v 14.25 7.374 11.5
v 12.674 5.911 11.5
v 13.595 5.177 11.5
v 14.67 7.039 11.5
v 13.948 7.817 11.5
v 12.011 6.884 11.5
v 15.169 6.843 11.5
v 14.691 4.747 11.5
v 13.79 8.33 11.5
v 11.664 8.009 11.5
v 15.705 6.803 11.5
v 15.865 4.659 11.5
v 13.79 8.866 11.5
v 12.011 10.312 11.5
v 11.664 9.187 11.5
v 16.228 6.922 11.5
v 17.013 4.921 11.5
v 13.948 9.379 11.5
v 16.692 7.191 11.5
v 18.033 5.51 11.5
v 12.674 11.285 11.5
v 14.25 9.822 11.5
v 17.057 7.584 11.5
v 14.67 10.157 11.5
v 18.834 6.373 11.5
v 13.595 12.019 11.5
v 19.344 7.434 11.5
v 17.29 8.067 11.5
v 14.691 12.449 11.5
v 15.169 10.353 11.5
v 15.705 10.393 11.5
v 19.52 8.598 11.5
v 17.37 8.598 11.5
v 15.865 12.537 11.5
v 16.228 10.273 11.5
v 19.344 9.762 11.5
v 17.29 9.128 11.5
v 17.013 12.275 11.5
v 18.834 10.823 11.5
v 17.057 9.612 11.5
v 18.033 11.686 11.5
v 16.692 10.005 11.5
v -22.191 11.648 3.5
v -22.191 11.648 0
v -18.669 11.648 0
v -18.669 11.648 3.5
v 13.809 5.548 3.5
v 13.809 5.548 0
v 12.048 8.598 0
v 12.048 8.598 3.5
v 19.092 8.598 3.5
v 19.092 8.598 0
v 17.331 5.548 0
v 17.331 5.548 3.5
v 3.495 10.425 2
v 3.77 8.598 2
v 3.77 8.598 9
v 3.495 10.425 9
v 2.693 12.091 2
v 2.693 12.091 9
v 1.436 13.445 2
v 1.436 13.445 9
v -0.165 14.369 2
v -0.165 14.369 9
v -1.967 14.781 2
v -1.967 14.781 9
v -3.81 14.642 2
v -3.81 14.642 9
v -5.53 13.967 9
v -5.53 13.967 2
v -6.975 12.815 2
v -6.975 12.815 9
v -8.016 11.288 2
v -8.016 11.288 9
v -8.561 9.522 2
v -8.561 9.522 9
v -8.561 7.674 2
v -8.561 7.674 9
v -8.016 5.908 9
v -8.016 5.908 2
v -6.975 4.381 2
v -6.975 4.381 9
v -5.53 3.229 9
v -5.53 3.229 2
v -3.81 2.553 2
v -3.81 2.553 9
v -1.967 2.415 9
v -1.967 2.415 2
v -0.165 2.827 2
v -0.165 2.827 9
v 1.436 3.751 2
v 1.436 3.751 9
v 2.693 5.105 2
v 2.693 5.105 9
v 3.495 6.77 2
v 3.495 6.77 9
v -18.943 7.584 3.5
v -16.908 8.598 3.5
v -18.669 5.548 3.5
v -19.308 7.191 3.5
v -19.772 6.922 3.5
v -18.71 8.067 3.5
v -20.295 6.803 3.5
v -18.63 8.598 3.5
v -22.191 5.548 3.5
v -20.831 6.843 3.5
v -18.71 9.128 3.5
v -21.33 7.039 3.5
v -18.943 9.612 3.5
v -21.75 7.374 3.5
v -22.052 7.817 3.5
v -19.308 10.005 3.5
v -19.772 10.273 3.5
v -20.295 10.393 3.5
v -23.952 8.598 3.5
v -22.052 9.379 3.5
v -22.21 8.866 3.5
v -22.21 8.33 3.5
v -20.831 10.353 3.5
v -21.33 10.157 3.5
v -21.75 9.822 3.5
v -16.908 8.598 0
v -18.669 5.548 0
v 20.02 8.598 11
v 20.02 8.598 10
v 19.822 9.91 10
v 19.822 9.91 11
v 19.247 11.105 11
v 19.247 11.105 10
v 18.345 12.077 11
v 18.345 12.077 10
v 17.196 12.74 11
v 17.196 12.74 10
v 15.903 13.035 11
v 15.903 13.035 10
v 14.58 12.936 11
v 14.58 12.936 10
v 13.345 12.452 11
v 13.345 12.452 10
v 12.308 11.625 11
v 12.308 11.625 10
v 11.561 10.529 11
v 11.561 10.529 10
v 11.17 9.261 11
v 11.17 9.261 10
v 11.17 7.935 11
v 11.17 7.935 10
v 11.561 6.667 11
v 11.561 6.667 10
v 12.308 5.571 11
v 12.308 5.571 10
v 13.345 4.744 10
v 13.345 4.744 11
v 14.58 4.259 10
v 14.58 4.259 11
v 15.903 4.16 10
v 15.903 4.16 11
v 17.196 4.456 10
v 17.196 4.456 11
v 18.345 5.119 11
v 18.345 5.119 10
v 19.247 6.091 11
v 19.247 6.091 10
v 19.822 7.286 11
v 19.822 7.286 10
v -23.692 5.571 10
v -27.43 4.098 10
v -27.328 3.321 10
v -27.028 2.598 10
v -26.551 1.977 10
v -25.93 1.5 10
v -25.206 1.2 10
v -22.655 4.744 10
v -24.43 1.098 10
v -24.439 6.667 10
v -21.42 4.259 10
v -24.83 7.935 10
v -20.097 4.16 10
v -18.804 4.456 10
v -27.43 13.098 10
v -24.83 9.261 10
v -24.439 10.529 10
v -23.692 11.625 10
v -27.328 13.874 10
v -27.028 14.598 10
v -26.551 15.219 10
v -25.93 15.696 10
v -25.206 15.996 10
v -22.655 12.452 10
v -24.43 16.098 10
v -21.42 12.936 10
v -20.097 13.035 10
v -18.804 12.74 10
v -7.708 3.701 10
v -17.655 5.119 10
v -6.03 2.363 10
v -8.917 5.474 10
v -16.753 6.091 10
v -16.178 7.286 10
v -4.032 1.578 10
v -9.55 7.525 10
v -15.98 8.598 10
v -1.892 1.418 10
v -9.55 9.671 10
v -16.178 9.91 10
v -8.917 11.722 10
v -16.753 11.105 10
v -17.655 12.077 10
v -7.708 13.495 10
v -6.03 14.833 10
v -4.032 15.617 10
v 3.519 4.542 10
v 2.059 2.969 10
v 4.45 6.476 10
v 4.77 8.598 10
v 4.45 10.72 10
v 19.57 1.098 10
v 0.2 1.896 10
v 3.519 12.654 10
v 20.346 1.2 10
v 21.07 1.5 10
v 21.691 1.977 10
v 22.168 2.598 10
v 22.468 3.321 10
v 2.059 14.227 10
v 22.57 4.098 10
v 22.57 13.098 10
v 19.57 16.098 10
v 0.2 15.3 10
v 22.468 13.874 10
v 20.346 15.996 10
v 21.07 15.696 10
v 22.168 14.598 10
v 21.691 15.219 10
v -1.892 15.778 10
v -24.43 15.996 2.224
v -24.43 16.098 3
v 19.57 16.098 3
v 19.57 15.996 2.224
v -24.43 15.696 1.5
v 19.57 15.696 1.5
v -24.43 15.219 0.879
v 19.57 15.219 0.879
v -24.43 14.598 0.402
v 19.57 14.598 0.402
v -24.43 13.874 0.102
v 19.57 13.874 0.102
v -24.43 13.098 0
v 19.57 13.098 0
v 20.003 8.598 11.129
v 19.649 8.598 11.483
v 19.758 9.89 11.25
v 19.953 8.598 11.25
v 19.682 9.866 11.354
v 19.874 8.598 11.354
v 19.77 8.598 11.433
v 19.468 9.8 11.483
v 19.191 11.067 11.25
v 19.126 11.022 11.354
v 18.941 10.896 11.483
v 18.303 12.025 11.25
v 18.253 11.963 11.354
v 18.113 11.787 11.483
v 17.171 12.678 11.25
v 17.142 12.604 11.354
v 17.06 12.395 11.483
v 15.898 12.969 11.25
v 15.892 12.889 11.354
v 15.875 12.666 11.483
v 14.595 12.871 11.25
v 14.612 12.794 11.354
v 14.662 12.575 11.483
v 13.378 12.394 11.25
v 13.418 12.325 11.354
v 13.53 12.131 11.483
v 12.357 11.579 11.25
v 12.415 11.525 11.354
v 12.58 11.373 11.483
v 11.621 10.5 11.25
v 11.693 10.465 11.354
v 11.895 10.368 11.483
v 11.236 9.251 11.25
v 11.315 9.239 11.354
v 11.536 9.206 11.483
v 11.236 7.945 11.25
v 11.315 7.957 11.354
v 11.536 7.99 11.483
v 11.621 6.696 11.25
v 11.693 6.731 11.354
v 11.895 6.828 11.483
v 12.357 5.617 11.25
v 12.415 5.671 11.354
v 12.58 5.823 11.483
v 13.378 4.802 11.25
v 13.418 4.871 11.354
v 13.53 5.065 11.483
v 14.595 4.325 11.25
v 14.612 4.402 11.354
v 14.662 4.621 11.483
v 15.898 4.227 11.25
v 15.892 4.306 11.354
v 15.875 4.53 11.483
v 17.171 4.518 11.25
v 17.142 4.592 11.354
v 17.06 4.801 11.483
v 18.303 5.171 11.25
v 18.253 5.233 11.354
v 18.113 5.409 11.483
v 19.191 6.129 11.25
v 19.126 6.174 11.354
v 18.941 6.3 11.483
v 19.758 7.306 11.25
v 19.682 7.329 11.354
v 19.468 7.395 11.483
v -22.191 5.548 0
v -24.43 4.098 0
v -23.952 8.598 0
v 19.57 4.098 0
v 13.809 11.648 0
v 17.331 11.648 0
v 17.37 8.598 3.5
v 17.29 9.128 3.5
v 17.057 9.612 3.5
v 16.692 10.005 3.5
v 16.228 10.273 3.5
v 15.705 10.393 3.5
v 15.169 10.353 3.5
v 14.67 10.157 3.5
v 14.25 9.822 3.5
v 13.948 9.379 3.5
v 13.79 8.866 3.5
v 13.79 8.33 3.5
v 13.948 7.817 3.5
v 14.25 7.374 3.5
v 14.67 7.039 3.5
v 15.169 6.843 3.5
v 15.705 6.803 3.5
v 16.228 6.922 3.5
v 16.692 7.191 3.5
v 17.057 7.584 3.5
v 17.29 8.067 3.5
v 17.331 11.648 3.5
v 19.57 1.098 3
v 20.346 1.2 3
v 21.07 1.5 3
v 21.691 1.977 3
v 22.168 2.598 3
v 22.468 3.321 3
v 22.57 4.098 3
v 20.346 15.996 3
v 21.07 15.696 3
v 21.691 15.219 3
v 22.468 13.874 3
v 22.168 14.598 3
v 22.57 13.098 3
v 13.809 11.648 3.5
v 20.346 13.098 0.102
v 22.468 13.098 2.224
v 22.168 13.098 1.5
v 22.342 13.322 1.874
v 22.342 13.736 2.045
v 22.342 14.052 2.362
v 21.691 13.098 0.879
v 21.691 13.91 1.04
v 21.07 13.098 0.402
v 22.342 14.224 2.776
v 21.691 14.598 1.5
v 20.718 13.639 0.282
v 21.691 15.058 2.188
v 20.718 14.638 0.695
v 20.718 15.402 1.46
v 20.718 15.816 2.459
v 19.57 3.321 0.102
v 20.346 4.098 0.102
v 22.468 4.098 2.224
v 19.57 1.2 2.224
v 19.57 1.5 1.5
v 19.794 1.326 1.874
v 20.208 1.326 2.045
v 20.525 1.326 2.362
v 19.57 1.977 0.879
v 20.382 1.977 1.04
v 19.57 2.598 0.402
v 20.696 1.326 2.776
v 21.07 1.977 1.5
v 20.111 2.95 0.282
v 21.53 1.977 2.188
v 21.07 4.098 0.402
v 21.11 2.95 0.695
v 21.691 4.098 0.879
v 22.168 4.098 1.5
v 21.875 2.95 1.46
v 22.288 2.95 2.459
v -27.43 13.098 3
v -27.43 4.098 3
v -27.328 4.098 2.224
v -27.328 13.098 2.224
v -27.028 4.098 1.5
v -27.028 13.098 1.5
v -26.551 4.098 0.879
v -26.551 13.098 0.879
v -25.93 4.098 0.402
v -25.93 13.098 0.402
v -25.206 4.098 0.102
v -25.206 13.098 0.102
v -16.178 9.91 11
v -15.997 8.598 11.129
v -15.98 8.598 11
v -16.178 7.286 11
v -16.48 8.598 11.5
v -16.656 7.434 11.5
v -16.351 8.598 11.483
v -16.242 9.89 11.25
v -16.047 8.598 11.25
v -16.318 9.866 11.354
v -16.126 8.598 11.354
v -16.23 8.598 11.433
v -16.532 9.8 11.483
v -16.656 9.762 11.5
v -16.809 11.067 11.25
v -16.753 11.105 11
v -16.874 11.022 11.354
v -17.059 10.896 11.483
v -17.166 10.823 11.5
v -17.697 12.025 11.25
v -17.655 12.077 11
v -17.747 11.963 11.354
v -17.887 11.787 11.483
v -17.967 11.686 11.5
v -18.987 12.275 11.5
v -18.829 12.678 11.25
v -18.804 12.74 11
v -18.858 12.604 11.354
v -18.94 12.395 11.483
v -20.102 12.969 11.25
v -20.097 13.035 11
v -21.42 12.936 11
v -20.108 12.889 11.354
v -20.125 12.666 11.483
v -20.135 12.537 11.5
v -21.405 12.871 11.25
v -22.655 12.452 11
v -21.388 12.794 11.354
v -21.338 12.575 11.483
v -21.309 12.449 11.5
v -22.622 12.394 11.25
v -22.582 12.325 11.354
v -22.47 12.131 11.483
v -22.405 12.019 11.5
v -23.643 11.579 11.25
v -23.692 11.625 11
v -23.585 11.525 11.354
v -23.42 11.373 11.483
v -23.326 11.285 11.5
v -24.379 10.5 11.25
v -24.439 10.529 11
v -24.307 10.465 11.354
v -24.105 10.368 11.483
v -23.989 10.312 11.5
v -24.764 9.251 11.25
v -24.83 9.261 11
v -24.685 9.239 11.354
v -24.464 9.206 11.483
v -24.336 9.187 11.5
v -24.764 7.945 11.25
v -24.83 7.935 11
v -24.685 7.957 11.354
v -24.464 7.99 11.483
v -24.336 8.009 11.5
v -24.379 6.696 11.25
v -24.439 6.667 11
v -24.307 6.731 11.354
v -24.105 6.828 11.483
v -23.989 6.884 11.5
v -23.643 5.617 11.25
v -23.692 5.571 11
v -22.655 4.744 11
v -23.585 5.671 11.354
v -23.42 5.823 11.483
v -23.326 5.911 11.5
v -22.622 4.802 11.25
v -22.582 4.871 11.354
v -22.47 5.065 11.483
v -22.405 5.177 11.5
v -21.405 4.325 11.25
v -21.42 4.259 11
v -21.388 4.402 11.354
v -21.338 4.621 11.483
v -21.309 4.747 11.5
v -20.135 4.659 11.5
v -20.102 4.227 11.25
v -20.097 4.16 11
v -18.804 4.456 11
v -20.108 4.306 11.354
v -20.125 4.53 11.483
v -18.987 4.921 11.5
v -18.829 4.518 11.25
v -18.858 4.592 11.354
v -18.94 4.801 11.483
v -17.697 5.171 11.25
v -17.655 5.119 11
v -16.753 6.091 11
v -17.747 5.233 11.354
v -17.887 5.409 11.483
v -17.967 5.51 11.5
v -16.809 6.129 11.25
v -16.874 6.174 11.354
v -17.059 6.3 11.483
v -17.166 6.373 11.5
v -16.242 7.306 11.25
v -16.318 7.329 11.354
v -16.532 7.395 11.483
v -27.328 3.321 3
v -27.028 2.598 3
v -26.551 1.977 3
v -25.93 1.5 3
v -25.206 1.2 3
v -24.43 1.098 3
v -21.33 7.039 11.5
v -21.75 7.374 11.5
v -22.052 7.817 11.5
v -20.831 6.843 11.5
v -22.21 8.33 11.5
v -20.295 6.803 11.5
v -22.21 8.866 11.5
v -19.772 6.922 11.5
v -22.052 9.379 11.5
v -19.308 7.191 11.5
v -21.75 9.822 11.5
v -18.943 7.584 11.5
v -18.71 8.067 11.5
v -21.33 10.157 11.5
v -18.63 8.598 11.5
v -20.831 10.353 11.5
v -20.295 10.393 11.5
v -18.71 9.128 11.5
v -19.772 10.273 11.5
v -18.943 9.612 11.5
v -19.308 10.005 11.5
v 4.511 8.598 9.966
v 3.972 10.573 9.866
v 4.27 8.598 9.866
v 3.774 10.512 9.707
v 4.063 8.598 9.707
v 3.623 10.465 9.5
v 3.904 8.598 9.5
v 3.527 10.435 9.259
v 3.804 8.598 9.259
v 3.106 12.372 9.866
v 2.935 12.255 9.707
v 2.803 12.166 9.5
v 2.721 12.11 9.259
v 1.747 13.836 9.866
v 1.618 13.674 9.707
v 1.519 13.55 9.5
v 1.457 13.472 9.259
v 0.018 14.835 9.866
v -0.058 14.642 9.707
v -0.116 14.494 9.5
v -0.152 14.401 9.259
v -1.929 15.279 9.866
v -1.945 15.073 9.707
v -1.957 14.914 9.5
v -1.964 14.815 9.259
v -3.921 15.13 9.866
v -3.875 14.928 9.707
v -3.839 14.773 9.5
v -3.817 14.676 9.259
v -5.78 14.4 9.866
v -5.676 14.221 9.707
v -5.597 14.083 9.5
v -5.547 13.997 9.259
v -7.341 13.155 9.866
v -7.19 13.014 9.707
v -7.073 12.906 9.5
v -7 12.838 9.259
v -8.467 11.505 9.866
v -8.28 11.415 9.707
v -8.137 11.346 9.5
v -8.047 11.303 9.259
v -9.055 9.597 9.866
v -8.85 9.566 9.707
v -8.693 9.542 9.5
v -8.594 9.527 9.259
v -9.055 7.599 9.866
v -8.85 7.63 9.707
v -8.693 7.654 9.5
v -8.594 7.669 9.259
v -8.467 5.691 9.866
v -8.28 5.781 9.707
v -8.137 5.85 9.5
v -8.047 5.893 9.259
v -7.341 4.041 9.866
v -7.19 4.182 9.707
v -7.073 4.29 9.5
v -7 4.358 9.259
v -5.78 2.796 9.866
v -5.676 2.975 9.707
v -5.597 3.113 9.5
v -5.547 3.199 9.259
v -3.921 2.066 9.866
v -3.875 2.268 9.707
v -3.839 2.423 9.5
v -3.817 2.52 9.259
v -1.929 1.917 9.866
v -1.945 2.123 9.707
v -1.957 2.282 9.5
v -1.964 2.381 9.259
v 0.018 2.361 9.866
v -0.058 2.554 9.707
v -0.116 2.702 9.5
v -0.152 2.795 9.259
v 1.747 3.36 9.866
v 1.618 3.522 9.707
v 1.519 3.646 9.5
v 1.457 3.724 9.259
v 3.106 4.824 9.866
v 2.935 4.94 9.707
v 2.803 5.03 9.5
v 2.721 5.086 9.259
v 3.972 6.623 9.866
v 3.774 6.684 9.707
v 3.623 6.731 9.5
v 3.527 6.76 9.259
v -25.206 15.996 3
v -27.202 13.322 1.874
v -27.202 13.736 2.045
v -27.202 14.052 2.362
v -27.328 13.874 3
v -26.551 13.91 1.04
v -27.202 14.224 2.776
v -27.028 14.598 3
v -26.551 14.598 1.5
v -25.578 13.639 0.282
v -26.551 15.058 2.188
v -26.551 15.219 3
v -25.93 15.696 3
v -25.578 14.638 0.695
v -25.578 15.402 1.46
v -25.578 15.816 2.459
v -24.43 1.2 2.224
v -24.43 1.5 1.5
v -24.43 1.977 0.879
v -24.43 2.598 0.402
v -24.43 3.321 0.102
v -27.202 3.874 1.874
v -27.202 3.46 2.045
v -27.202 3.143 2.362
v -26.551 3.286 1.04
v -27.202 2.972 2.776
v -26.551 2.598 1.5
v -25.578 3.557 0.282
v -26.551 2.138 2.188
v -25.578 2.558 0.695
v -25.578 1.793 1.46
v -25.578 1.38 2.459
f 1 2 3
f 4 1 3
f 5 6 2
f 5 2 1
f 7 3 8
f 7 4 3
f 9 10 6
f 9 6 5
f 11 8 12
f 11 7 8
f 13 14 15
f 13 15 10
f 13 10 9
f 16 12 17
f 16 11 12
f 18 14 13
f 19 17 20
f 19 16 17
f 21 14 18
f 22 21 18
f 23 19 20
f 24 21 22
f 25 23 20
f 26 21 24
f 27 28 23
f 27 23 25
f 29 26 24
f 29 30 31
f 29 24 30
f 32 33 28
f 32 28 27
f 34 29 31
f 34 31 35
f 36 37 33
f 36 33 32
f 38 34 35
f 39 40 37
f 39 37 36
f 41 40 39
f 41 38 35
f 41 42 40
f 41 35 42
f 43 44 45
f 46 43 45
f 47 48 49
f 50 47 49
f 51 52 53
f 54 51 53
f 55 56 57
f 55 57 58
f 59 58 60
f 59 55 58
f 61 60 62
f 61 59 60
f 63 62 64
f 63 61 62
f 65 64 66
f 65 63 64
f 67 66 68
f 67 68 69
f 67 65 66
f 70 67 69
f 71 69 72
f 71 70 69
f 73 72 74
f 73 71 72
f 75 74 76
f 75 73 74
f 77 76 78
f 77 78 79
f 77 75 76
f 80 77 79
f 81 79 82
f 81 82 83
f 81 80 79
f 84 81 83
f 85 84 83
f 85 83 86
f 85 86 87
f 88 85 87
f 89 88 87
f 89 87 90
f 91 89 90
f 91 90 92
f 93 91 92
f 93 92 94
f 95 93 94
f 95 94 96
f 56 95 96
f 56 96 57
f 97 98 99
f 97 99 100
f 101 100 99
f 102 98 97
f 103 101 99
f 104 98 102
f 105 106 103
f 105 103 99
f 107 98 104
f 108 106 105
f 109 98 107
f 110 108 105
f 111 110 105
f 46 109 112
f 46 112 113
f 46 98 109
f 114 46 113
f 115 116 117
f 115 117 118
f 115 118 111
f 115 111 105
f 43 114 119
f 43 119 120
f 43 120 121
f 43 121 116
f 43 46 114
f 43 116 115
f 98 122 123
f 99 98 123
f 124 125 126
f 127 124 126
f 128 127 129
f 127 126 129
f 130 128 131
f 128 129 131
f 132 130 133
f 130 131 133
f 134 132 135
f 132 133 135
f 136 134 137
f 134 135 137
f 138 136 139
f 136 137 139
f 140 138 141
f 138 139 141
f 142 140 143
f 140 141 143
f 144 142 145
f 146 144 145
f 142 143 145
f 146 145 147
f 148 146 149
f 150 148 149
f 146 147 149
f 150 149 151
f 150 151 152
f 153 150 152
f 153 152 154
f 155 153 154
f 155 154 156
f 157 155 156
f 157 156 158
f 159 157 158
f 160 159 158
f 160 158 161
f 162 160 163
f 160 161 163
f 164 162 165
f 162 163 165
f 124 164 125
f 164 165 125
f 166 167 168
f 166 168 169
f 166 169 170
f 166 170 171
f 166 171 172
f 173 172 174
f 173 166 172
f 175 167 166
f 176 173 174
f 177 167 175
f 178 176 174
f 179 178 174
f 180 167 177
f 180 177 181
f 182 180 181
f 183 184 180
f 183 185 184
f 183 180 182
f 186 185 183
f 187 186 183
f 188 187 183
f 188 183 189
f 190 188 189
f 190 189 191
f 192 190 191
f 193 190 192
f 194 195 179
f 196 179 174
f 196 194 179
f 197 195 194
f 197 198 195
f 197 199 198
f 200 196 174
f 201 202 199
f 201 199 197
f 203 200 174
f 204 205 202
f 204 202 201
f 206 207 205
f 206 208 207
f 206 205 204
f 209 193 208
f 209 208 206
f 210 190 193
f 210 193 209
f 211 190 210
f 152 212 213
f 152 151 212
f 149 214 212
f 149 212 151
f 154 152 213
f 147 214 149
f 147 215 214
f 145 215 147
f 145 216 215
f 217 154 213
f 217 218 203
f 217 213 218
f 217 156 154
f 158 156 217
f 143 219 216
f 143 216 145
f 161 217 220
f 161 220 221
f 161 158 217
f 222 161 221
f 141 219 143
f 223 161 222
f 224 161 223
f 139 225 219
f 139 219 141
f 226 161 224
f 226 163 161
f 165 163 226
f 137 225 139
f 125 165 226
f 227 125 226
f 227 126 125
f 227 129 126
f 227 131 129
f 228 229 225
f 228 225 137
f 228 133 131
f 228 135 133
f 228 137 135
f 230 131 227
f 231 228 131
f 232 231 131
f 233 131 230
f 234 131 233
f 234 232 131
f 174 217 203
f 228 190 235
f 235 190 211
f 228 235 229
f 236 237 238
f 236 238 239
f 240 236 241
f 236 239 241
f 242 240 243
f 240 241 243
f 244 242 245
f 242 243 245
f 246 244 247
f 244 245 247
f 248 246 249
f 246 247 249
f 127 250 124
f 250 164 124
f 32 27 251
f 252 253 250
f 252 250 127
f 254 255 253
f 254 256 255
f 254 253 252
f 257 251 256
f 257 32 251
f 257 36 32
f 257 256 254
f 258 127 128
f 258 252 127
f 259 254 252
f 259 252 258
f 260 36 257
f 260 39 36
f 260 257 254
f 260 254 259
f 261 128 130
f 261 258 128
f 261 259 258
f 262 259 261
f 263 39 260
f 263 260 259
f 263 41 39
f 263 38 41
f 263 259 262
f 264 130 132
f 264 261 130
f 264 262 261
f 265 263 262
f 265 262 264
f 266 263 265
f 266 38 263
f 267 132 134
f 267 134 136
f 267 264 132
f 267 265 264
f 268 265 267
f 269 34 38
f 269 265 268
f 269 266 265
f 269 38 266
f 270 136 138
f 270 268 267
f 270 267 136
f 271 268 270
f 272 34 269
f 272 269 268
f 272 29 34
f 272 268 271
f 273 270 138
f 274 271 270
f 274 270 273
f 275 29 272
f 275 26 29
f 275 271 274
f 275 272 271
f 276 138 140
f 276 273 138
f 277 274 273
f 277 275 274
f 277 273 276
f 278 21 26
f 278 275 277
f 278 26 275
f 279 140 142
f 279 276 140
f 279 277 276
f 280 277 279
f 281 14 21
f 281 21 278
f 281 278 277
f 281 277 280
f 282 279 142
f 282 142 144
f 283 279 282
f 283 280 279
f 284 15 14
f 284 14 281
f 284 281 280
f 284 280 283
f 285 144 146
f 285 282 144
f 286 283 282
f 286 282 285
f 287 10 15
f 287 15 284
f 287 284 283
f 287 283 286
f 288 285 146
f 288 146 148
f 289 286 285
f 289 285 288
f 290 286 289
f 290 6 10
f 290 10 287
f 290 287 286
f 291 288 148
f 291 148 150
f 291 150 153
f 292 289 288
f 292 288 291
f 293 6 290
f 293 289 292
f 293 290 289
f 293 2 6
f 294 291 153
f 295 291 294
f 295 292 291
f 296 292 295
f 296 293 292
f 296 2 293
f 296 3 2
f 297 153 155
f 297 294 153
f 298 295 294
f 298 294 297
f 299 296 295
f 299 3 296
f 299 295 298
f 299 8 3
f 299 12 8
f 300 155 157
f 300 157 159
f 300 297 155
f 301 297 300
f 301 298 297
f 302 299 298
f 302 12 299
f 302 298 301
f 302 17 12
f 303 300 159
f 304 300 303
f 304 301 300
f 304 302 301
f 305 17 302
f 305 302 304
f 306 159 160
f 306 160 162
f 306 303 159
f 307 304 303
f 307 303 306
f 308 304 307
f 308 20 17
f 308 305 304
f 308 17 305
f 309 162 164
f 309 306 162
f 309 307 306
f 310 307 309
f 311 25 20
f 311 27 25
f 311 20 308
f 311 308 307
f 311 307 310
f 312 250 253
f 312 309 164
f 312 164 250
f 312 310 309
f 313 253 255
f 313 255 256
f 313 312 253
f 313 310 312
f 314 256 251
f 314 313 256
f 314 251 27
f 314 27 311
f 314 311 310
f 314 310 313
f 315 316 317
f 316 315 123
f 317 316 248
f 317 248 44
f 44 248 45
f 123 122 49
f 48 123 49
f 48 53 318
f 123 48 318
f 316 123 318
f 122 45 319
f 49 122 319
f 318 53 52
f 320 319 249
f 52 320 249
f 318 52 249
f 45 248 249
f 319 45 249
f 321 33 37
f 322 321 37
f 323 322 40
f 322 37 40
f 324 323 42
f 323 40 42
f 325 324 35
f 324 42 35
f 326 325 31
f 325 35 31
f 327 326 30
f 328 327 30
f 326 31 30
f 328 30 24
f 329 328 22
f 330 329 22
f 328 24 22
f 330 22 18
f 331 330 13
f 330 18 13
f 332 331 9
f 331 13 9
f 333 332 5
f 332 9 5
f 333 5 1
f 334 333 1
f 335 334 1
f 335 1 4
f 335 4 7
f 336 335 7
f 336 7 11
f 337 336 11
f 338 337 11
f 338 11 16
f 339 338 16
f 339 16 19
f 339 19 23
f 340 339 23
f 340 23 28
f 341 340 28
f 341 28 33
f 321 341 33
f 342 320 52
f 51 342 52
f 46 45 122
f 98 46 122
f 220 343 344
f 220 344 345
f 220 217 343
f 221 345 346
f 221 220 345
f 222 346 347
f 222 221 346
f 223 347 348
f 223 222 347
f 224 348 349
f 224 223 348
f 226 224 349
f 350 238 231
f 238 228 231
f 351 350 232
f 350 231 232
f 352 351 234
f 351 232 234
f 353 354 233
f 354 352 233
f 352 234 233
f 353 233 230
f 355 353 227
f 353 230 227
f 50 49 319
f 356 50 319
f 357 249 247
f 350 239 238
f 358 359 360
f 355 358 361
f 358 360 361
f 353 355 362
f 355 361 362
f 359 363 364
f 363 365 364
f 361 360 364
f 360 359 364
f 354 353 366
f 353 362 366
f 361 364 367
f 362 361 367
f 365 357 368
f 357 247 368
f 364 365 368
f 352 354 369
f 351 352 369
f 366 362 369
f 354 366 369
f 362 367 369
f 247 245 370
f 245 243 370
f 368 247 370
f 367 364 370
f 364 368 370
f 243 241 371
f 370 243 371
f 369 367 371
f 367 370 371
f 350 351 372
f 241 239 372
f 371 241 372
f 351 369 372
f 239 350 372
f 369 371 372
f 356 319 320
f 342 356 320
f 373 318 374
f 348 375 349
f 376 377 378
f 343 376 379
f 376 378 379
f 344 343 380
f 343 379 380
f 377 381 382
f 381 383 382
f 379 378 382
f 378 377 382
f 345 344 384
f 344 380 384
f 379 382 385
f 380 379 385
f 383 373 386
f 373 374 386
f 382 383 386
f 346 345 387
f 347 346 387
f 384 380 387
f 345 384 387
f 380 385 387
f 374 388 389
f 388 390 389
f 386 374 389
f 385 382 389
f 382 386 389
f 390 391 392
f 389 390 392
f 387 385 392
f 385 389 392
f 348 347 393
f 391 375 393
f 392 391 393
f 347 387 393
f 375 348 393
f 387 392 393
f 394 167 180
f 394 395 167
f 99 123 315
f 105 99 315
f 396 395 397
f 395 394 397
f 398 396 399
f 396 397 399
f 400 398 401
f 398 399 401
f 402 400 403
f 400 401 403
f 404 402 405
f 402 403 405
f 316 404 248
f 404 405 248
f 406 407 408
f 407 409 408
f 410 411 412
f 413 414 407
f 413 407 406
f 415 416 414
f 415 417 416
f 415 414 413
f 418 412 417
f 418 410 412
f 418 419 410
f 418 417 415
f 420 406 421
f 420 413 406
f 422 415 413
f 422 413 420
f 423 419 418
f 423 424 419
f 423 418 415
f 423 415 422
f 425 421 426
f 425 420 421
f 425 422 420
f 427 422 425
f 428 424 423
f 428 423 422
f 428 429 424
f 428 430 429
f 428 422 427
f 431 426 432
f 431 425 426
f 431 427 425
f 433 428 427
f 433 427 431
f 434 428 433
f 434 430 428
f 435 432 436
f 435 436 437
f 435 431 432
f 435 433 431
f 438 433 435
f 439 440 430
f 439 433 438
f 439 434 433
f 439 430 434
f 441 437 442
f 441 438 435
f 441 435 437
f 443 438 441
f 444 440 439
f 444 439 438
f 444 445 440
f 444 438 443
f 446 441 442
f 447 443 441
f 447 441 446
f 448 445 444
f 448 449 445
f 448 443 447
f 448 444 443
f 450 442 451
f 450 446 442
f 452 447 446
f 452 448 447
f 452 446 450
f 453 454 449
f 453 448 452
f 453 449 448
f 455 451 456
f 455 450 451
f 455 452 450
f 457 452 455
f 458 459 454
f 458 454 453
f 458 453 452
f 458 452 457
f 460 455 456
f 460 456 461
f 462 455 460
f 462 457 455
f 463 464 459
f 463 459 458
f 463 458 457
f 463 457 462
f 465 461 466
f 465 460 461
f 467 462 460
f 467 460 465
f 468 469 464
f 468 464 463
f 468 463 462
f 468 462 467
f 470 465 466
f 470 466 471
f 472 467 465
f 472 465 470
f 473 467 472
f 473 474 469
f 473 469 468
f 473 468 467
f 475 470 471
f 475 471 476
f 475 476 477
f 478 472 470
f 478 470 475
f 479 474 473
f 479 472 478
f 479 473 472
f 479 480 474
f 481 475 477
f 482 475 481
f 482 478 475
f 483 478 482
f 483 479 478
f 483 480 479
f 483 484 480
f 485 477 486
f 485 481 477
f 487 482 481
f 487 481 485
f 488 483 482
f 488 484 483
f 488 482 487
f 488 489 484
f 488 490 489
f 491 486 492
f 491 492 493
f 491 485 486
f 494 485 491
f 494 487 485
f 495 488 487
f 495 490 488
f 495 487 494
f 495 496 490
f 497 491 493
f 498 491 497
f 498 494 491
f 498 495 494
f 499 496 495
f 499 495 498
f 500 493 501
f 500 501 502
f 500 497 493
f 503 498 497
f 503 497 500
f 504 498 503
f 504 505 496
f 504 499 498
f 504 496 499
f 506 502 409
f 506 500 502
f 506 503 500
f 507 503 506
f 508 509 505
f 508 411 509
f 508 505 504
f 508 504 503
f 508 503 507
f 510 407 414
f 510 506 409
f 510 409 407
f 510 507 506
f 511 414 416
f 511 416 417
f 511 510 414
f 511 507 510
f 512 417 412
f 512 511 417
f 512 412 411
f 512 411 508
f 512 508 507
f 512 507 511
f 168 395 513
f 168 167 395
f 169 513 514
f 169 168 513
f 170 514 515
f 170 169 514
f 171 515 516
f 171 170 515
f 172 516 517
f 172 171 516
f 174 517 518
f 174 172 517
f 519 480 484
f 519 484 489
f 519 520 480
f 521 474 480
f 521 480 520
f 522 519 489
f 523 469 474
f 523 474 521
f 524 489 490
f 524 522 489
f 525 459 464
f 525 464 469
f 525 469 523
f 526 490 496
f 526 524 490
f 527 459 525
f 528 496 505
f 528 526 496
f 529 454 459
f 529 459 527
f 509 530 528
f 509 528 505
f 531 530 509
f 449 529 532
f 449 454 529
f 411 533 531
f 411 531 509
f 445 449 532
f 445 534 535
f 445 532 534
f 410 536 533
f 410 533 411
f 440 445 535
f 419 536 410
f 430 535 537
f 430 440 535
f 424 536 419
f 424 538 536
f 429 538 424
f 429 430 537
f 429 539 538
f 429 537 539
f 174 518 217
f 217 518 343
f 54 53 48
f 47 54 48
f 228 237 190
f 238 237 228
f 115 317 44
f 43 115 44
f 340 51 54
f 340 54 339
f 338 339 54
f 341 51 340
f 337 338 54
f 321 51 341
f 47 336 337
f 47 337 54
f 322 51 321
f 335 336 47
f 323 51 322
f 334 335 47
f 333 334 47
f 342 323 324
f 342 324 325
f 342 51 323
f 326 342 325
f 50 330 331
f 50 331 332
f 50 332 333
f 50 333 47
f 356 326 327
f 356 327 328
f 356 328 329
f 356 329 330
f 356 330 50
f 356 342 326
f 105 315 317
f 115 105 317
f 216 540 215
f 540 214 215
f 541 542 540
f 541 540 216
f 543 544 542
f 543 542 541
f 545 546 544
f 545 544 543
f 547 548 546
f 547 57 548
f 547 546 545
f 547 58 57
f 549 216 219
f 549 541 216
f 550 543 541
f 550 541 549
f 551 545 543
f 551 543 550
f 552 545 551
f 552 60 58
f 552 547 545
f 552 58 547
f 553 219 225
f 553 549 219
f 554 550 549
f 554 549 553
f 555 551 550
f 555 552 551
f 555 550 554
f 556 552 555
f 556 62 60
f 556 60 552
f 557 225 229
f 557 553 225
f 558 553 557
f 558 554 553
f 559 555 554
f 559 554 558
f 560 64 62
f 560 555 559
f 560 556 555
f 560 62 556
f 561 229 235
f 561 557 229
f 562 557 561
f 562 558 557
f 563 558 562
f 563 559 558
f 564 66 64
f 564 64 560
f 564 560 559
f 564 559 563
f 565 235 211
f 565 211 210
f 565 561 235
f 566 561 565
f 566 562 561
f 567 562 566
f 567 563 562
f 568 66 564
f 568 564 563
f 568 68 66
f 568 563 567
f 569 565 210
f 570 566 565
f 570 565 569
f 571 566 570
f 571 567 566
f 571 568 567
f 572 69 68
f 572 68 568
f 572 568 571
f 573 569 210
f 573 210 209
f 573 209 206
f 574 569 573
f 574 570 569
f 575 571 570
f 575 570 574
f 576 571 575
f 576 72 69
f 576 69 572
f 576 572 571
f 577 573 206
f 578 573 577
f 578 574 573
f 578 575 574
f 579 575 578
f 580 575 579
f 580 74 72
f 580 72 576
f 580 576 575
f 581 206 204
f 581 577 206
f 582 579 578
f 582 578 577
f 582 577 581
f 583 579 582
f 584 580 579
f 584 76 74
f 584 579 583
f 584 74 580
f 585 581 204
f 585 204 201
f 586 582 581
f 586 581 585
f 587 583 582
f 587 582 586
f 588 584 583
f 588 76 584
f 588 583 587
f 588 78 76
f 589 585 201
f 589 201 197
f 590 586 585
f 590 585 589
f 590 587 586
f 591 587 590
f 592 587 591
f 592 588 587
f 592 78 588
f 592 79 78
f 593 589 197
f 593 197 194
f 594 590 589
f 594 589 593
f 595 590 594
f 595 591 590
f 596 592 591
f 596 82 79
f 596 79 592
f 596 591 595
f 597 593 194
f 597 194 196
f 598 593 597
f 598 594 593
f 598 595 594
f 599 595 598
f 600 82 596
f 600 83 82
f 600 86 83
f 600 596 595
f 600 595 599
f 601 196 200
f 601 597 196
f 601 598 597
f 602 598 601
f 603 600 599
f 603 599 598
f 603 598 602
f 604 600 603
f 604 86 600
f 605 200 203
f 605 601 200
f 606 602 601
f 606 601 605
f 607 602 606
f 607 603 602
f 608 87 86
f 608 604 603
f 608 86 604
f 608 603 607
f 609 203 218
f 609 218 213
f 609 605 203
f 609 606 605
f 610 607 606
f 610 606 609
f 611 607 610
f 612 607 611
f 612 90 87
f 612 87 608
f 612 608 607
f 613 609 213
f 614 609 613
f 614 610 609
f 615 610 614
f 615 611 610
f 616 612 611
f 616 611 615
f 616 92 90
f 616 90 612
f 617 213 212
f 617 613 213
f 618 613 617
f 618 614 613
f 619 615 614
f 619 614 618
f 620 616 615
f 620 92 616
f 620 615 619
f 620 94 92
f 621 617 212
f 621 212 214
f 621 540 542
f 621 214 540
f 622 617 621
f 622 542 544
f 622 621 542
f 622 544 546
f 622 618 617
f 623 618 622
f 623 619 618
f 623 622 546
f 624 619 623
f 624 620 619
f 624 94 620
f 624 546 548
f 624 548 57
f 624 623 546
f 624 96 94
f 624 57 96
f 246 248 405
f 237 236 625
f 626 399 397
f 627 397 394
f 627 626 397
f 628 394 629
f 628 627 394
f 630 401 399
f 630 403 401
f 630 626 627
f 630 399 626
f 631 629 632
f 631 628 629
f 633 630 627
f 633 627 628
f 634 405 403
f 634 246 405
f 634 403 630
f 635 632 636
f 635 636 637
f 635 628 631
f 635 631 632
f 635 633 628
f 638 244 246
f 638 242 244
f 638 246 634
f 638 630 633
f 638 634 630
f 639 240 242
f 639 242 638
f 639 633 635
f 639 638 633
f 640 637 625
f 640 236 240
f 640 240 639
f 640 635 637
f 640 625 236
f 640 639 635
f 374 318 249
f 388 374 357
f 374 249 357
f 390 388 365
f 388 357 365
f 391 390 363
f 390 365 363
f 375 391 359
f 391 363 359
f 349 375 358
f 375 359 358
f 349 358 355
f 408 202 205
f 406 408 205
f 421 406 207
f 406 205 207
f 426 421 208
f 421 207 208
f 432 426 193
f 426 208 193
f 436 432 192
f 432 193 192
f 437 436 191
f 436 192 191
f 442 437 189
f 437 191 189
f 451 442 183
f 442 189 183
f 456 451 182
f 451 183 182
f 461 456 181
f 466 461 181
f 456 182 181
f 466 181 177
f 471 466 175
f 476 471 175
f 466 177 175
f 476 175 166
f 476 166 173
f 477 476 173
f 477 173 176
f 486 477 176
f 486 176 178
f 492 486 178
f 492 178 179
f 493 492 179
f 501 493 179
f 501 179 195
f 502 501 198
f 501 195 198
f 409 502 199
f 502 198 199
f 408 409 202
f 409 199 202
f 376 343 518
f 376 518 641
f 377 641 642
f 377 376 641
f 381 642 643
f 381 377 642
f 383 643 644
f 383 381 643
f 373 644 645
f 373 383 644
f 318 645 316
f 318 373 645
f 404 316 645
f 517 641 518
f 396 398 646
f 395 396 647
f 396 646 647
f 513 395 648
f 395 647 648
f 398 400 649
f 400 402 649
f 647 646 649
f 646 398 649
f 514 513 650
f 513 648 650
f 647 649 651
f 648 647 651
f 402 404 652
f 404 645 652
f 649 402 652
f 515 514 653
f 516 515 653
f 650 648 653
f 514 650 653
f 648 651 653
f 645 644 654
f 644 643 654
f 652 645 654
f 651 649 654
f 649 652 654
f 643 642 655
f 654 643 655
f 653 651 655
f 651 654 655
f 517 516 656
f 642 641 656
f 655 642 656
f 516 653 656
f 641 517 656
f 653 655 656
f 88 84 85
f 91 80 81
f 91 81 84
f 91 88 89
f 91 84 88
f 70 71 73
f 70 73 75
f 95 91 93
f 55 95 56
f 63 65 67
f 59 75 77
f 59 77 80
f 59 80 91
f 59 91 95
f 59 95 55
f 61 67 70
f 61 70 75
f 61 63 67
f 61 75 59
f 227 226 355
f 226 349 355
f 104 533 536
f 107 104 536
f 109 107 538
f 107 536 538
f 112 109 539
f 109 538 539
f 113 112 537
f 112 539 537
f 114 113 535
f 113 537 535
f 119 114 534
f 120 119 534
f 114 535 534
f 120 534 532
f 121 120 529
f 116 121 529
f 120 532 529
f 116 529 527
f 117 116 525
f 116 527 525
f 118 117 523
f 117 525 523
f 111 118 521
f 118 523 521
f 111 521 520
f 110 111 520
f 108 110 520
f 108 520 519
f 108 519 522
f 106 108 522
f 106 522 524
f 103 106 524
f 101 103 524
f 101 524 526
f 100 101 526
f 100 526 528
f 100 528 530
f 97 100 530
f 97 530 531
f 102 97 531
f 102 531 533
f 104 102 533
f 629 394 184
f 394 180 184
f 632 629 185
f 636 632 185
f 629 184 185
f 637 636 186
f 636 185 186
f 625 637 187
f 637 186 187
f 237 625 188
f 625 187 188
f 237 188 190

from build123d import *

# Parameters (mm, degrees)
CROQUIS1_W              = 50
CROQUIS1_H              = 15
SALIENTE_EXTRUIR1_DEPTH = 10
CROQUIS2_R              = 6.2
CROQUIS2_R_2            = 4.45
SALIENTE_EXTRUIR2_DEPTH = 1.5
CORTAR_EXTRUIR1_START   = -9.5
CROQUIS3_R              = 6.2
CORTAR_EXTRUIR1_DEPTH   = 9.5
CROQUIS4_R              = 1.8
CORTAR_EXTRUIR2_DEPTH   = 15.5
CORTAR_EXTRUIR3_DEPTH   = 3.5
REDONDEO1_R             = 3
REDONDEO2_R             = 1
REDONDEO3_R             = 0.5


with BuildPart() as part:
    # Croquis1 → Saliente-Extruir1 (new body)
    with BuildSketch(Plane.XY):
        with Locations((-2.430013275, 8.597922849)):
            Rectangle(CROQUIS1_W, CROQUIS1_H)
    extrude(amount=SALIENTE_EXTRUIR1_DEPTH)

    # Croquis2 → Saliente-Extruir2 (add)
    with BuildSketch(Plane.XY.offset(10)):
        with Locations((-2.430013275, 8.597922849)):
            Circle(CROQUIS2_R)
        with Locations((-20.430013275, 8.597922849)):
            Circle(CROQUIS2_R_2)
        with Locations((15.569986725, 8.597922849)):
            Circle(CROQUIS2_R_2)
    extrude(amount=SALIENTE_EXTRUIR2_DEPTH)

    # Croquis3 → Cortar-Extruir1 (cut)
    with BuildSketch(Plane.XY.offset(11.5).offset(CORTAR_EXTRUIR1_START)):
        with Locations((-2.430013275, 8.597922849)):
            Circle(CROQUIS3_R)
    extrude(amount=CORTAR_EXTRUIR1_DEPTH, mode=Mode.SUBTRACT)

    # Croquis4 → Cortar-Extruir2 (cut)
    with BuildSketch(Plane.XY.offset(11.5)):
        with Locations((-20.430013275, 8.597922849)):
            Circle(CROQUIS4_R)
        with Locations((15.569986725, 8.597922849)):
            Circle(CROQUIS4_R)
    extrude(amount=-CORTAR_EXTRUIR2_DEPTH, mode=Mode.SUBTRACT)

    # Croquis5 → Cortar-Extruir3 (cut)
    with BuildSketch(Plane(origin=(0, 0, 0), x_dir=(-1, 0, 0), z_dir=(0, 0, -1))):
        Polygon((-12.048150083, 8.597922849), (-13.809068404, 11.647922849), (-17.330905046, 11.647922849), (-19.091823367, 8.597922849), (-17.330905046, 5.547922849), (-13.809068404, 5.547922849), align=None)
        Polygon((23.951849917, 8.597922849), (22.190931596, 11.647922849), (18.669094954, 11.647922849), (16.908176633, 8.597922849), (18.669094954, 5.547922849), (22.190931596, 5.547922849), align=None)
    extrude(amount=-CORTAR_EXTRUIR3_DEPTH, mode=Mode.SUBTRACT)

    # Redondeo1
    redondeo1_edges = [part.edges().sort_by_distance(p)[0] for p in [
        (-2.430013275, 16.097922849, 0),
        (22.569986725, 8.597922849, 0),
        (-2.430013275, 1.097922849, 0),
        (-27.430013275, 8.597922849, 0),
        (-27.430013275, 16.097922849, 5),
        (22.569986725, 16.097922849, 5),
        (22.569986725, 1.097922849, 5),
        (-27.430013275, 1.097922849, 5),
    ]]
    fillet(redondeo1_edges, radius=REDONDEO1_R)

    # Redondeo2
    redondeo2_edges = [part.edges().sort_by_distance(p)[0] for p in [
        (-8.630013275, 8.597922849, 10),
    ]]
    fillet(redondeo2_edges, radius=REDONDEO2_R)

    # Redondeo3
    redondeo3_edges = [part.edges().sort_by_distance(p)[0] for p in [
        (-24.880013275, 8.597922849, 11.5),
        (11.119986725, 8.597922849, 11.5),
    ]]
    fillet(redondeo3_edges, radius=REDONDEO3_R)


solid = part.part
